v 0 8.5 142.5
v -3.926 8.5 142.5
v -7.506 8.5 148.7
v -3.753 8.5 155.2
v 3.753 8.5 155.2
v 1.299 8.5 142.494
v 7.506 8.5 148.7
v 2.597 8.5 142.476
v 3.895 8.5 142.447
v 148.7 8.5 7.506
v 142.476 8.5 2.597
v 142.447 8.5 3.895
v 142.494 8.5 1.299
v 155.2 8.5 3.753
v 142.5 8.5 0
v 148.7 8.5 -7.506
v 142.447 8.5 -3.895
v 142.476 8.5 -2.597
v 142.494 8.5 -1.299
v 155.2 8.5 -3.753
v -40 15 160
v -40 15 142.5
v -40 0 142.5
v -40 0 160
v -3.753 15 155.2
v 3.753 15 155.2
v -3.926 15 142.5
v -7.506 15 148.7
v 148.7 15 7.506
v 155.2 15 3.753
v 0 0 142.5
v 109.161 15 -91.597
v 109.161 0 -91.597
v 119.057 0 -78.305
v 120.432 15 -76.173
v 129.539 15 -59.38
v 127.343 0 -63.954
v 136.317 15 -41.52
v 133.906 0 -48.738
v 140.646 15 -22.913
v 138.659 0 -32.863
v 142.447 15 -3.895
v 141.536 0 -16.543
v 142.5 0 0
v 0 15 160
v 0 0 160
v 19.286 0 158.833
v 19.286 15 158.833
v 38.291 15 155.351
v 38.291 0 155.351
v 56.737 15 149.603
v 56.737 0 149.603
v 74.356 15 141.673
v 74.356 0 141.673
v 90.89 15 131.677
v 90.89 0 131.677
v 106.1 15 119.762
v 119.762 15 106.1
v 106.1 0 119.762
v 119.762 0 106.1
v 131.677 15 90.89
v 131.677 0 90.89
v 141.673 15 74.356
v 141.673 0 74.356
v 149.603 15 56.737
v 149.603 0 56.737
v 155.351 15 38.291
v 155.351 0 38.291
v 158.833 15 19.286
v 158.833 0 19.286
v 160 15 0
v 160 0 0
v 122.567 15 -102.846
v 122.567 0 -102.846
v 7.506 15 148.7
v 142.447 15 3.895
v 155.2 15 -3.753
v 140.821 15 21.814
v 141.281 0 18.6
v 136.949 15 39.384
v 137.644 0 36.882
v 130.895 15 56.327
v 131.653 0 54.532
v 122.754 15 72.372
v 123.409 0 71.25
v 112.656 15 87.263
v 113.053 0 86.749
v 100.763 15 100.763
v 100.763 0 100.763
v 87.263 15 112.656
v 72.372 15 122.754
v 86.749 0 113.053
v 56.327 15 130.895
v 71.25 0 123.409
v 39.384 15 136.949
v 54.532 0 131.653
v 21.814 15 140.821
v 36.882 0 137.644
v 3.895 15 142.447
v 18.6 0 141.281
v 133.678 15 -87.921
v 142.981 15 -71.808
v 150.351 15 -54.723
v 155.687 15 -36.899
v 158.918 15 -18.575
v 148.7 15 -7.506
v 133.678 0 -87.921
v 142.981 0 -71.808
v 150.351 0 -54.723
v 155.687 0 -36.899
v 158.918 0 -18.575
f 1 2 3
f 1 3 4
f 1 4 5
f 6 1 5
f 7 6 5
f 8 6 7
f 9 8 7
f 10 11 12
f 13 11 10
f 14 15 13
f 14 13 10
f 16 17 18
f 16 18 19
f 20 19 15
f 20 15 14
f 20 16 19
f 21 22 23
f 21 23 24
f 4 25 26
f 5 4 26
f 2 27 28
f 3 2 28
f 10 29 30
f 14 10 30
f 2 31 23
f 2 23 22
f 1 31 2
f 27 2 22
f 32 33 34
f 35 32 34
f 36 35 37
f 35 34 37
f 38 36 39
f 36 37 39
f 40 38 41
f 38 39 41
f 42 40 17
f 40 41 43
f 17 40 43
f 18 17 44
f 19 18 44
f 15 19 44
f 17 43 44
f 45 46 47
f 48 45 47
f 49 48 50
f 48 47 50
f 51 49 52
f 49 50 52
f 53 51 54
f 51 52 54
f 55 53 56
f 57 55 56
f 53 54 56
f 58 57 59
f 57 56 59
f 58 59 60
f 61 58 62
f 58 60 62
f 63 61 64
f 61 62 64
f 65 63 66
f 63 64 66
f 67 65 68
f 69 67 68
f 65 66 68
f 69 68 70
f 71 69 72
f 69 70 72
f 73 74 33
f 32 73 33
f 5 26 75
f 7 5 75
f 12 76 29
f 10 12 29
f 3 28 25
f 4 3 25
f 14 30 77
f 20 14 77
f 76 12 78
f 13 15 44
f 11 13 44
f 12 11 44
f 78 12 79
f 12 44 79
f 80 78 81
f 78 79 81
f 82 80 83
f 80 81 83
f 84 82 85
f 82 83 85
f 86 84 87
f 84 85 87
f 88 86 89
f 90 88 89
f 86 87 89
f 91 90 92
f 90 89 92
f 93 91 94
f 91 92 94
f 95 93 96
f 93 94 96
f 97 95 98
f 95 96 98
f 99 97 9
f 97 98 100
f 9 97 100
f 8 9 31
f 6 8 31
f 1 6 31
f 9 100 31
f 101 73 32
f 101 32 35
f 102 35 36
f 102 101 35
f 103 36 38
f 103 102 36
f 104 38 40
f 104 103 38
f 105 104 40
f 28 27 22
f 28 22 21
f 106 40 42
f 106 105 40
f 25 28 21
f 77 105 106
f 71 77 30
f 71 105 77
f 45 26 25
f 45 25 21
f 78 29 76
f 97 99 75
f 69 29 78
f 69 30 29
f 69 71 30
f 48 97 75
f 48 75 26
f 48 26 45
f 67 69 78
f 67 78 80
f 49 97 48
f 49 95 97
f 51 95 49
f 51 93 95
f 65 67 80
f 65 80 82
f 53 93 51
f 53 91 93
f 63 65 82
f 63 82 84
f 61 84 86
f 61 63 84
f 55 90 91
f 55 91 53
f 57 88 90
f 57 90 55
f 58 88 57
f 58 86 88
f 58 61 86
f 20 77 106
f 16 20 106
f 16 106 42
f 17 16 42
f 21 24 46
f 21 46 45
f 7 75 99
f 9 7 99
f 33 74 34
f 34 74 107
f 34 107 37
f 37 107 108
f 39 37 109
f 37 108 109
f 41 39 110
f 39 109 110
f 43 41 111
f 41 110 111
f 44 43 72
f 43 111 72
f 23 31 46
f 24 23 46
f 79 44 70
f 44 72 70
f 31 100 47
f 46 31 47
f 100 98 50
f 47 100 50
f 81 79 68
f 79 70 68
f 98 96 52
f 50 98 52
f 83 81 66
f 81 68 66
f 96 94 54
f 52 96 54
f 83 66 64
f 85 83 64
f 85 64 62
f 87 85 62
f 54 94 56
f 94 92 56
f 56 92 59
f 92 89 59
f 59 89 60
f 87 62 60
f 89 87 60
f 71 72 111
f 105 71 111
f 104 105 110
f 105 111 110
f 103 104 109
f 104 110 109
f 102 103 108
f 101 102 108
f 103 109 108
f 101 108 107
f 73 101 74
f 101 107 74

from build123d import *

# Parameters (mm, degrees)
BOSS_EXTRUDE1_DEPTH = 15
SKETCH2_W           = 17.5
SKETCH2_H           = 15
BOSS_EXTRUDE2_DEPTH = 40
CUT_EXTRUDE1_DEPTH  = 6.5


with BuildPart() as part:
    # Sketch1 → Boss-Extrude1 (new body)
    with BuildSketch(Plane(origin=(0, 0, 0), x_dir=(1, 0, 0), z_dir=(0, 1, 0))):
        with BuildLine():
            ThreePointArc((142.5, 0), (100.762716319, -100.762716319), (0, -142.5))
            Line((0, -142.5), (0, -160))
            ThreePointArc((0, -160), (113.13708499, -113.13708499), (160, 0))
            ThreePointArc((160, 0), (150.350819326, 54.723222932), (122.567110899, 102.84601755))
            Line((122.567110899, 102.84601755), (109.161333144, 91.59723438))
            ThreePointArc((109.161333144, 91.59723438), (133.906198462, 48.737870424), (142.5, 0))
        make_face()
    extrude(amount=BOSS_EXTRUDE1_DEPTH)

    # Sketch2 → Boss-Extrude2 (add)
    with BuildSketch(Plane.ZY):
        with Locations((151.25, 7.5)):
            Rectangle(SKETCH2_W, SKETCH2_H)
    extrude(amount=BOSS_EXTRUDE2_DEPTH)

    # Sketch3 → Cut-Extrude1 (cut)
    with BuildSketch(Plane(origin=(0, 15, 0), x_dir=(1, 0, 0), z_dir=(0, 1, 0))):
        Polygon((-3.75277675, -142.2), (-7.505553499, -148.7), (-3.75277675, -155.2), (3.75277675, -155.2), (7.505553499, -148.7), (3.75277675, -142.2), align=None)
        Polygon((142.2, 3.75277675), (142.2, -3.75277675), (148.7, -7.505553499), (155.2, -3.75277675), (155.2, 3.75277675), (148.7, 7.505553499), align=None)
    extrude(amount=-CUT_EXTRUDE1_DEPTH, mode=Mode.SUBTRACT)


solid = part.part
